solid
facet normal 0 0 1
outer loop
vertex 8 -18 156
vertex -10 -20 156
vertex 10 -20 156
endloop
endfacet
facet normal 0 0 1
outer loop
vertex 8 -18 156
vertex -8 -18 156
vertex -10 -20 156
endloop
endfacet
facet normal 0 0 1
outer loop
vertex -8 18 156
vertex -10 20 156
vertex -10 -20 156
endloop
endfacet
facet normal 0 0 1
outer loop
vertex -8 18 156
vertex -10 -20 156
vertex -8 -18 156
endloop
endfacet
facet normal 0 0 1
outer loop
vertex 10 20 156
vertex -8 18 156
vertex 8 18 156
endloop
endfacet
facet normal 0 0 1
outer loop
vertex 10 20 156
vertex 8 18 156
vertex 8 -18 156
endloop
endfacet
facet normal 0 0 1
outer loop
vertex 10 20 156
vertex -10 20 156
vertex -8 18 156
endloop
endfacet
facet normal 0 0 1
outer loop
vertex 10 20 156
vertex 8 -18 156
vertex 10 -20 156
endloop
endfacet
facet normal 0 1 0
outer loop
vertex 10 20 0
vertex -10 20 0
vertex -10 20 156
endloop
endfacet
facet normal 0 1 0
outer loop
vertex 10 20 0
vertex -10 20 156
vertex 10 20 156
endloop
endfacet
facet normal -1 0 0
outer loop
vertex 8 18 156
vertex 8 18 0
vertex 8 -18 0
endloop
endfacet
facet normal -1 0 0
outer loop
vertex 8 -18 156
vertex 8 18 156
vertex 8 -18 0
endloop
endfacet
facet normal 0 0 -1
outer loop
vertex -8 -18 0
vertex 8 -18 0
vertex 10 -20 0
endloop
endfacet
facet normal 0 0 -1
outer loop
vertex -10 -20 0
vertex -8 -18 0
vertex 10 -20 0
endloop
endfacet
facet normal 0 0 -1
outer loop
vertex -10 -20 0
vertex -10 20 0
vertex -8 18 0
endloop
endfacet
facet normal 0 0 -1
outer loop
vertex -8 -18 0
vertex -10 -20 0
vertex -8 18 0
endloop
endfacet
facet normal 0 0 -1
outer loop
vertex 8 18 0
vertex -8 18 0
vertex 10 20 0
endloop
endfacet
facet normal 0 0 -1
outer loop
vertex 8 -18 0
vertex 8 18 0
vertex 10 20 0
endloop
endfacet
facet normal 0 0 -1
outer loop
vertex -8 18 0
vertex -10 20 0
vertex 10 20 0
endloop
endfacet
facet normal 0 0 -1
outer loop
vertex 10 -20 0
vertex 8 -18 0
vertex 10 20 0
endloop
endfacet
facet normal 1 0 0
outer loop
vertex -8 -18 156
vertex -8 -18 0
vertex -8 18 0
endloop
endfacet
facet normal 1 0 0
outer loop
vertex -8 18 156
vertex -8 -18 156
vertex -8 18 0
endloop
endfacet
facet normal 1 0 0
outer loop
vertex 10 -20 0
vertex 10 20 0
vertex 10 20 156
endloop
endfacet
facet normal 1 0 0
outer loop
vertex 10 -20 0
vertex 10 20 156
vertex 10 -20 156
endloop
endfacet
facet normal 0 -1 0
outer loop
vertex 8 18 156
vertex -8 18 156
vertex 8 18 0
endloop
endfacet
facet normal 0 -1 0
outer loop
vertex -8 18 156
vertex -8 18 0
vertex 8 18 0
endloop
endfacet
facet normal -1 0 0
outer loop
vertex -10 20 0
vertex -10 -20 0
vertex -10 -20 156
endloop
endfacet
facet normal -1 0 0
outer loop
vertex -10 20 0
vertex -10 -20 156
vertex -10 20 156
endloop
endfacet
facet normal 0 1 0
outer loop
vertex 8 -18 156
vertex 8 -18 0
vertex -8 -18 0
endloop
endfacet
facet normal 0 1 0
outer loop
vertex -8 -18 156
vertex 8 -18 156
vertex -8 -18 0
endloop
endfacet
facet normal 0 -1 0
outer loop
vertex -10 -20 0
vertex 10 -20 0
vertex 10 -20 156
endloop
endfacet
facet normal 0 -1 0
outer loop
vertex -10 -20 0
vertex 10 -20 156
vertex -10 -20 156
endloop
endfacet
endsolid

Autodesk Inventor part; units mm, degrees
ref_plane "YZ Plane" through (0, 0, 0) normal (1, 0, 0) x (0, 1, 0)
ref_plane "XZ Plane" through (0, 0, 0) normal (0, 1, 0) x (-1, 0, 0)
ref_plane "XY Plane" through (0, 0, 0) normal (0, 0, 1) x (1, 0, 0)
sketch "Boceto1" plane through (0, 0, 0) normal (0, 0, 1) x (1, 0, 0)
  line L0 (-10, 20) -> (10, 20)
  line L1 (10, 20) -> (10, -20)
  line L2 (10, -20) -> (-10, -20)
  line L3 (-10, -20) -> (-10, 20)
  line L4 (-10, 20) -> (10, -20) construction
  line L5 (6.3055, 0) -> (10, 0) construction
  line L6 (0, -12.611) -> (0, -20) construction
  line L7 (-8, 18) -> (8, 18)
  line L8 (8, 18) -> (8, -18)
  line L9 (8, -18) -> (-8, -18)
  line L10 (-8, -18) -> (-8, 18)
  line L11 (-8, 0) -> (-10, 0)
  line L12 (0, 18) -> (0, 20)
  point P0 (0, 0)
  point P1 (0, 0)
  dimension "d0" = 40
  dimension "d4" = 20
  dimension "d5" = 2
  dimension "d6" = 2
extrude "Extrusión1" add sketch "Boceto1" along normal blind 156 contours L0 L12 L7 L10 L11 L3 | L0 L1 L2 L3 L11 L10 L9 L8 L7 L12
properties part number "C_358_40_2"
